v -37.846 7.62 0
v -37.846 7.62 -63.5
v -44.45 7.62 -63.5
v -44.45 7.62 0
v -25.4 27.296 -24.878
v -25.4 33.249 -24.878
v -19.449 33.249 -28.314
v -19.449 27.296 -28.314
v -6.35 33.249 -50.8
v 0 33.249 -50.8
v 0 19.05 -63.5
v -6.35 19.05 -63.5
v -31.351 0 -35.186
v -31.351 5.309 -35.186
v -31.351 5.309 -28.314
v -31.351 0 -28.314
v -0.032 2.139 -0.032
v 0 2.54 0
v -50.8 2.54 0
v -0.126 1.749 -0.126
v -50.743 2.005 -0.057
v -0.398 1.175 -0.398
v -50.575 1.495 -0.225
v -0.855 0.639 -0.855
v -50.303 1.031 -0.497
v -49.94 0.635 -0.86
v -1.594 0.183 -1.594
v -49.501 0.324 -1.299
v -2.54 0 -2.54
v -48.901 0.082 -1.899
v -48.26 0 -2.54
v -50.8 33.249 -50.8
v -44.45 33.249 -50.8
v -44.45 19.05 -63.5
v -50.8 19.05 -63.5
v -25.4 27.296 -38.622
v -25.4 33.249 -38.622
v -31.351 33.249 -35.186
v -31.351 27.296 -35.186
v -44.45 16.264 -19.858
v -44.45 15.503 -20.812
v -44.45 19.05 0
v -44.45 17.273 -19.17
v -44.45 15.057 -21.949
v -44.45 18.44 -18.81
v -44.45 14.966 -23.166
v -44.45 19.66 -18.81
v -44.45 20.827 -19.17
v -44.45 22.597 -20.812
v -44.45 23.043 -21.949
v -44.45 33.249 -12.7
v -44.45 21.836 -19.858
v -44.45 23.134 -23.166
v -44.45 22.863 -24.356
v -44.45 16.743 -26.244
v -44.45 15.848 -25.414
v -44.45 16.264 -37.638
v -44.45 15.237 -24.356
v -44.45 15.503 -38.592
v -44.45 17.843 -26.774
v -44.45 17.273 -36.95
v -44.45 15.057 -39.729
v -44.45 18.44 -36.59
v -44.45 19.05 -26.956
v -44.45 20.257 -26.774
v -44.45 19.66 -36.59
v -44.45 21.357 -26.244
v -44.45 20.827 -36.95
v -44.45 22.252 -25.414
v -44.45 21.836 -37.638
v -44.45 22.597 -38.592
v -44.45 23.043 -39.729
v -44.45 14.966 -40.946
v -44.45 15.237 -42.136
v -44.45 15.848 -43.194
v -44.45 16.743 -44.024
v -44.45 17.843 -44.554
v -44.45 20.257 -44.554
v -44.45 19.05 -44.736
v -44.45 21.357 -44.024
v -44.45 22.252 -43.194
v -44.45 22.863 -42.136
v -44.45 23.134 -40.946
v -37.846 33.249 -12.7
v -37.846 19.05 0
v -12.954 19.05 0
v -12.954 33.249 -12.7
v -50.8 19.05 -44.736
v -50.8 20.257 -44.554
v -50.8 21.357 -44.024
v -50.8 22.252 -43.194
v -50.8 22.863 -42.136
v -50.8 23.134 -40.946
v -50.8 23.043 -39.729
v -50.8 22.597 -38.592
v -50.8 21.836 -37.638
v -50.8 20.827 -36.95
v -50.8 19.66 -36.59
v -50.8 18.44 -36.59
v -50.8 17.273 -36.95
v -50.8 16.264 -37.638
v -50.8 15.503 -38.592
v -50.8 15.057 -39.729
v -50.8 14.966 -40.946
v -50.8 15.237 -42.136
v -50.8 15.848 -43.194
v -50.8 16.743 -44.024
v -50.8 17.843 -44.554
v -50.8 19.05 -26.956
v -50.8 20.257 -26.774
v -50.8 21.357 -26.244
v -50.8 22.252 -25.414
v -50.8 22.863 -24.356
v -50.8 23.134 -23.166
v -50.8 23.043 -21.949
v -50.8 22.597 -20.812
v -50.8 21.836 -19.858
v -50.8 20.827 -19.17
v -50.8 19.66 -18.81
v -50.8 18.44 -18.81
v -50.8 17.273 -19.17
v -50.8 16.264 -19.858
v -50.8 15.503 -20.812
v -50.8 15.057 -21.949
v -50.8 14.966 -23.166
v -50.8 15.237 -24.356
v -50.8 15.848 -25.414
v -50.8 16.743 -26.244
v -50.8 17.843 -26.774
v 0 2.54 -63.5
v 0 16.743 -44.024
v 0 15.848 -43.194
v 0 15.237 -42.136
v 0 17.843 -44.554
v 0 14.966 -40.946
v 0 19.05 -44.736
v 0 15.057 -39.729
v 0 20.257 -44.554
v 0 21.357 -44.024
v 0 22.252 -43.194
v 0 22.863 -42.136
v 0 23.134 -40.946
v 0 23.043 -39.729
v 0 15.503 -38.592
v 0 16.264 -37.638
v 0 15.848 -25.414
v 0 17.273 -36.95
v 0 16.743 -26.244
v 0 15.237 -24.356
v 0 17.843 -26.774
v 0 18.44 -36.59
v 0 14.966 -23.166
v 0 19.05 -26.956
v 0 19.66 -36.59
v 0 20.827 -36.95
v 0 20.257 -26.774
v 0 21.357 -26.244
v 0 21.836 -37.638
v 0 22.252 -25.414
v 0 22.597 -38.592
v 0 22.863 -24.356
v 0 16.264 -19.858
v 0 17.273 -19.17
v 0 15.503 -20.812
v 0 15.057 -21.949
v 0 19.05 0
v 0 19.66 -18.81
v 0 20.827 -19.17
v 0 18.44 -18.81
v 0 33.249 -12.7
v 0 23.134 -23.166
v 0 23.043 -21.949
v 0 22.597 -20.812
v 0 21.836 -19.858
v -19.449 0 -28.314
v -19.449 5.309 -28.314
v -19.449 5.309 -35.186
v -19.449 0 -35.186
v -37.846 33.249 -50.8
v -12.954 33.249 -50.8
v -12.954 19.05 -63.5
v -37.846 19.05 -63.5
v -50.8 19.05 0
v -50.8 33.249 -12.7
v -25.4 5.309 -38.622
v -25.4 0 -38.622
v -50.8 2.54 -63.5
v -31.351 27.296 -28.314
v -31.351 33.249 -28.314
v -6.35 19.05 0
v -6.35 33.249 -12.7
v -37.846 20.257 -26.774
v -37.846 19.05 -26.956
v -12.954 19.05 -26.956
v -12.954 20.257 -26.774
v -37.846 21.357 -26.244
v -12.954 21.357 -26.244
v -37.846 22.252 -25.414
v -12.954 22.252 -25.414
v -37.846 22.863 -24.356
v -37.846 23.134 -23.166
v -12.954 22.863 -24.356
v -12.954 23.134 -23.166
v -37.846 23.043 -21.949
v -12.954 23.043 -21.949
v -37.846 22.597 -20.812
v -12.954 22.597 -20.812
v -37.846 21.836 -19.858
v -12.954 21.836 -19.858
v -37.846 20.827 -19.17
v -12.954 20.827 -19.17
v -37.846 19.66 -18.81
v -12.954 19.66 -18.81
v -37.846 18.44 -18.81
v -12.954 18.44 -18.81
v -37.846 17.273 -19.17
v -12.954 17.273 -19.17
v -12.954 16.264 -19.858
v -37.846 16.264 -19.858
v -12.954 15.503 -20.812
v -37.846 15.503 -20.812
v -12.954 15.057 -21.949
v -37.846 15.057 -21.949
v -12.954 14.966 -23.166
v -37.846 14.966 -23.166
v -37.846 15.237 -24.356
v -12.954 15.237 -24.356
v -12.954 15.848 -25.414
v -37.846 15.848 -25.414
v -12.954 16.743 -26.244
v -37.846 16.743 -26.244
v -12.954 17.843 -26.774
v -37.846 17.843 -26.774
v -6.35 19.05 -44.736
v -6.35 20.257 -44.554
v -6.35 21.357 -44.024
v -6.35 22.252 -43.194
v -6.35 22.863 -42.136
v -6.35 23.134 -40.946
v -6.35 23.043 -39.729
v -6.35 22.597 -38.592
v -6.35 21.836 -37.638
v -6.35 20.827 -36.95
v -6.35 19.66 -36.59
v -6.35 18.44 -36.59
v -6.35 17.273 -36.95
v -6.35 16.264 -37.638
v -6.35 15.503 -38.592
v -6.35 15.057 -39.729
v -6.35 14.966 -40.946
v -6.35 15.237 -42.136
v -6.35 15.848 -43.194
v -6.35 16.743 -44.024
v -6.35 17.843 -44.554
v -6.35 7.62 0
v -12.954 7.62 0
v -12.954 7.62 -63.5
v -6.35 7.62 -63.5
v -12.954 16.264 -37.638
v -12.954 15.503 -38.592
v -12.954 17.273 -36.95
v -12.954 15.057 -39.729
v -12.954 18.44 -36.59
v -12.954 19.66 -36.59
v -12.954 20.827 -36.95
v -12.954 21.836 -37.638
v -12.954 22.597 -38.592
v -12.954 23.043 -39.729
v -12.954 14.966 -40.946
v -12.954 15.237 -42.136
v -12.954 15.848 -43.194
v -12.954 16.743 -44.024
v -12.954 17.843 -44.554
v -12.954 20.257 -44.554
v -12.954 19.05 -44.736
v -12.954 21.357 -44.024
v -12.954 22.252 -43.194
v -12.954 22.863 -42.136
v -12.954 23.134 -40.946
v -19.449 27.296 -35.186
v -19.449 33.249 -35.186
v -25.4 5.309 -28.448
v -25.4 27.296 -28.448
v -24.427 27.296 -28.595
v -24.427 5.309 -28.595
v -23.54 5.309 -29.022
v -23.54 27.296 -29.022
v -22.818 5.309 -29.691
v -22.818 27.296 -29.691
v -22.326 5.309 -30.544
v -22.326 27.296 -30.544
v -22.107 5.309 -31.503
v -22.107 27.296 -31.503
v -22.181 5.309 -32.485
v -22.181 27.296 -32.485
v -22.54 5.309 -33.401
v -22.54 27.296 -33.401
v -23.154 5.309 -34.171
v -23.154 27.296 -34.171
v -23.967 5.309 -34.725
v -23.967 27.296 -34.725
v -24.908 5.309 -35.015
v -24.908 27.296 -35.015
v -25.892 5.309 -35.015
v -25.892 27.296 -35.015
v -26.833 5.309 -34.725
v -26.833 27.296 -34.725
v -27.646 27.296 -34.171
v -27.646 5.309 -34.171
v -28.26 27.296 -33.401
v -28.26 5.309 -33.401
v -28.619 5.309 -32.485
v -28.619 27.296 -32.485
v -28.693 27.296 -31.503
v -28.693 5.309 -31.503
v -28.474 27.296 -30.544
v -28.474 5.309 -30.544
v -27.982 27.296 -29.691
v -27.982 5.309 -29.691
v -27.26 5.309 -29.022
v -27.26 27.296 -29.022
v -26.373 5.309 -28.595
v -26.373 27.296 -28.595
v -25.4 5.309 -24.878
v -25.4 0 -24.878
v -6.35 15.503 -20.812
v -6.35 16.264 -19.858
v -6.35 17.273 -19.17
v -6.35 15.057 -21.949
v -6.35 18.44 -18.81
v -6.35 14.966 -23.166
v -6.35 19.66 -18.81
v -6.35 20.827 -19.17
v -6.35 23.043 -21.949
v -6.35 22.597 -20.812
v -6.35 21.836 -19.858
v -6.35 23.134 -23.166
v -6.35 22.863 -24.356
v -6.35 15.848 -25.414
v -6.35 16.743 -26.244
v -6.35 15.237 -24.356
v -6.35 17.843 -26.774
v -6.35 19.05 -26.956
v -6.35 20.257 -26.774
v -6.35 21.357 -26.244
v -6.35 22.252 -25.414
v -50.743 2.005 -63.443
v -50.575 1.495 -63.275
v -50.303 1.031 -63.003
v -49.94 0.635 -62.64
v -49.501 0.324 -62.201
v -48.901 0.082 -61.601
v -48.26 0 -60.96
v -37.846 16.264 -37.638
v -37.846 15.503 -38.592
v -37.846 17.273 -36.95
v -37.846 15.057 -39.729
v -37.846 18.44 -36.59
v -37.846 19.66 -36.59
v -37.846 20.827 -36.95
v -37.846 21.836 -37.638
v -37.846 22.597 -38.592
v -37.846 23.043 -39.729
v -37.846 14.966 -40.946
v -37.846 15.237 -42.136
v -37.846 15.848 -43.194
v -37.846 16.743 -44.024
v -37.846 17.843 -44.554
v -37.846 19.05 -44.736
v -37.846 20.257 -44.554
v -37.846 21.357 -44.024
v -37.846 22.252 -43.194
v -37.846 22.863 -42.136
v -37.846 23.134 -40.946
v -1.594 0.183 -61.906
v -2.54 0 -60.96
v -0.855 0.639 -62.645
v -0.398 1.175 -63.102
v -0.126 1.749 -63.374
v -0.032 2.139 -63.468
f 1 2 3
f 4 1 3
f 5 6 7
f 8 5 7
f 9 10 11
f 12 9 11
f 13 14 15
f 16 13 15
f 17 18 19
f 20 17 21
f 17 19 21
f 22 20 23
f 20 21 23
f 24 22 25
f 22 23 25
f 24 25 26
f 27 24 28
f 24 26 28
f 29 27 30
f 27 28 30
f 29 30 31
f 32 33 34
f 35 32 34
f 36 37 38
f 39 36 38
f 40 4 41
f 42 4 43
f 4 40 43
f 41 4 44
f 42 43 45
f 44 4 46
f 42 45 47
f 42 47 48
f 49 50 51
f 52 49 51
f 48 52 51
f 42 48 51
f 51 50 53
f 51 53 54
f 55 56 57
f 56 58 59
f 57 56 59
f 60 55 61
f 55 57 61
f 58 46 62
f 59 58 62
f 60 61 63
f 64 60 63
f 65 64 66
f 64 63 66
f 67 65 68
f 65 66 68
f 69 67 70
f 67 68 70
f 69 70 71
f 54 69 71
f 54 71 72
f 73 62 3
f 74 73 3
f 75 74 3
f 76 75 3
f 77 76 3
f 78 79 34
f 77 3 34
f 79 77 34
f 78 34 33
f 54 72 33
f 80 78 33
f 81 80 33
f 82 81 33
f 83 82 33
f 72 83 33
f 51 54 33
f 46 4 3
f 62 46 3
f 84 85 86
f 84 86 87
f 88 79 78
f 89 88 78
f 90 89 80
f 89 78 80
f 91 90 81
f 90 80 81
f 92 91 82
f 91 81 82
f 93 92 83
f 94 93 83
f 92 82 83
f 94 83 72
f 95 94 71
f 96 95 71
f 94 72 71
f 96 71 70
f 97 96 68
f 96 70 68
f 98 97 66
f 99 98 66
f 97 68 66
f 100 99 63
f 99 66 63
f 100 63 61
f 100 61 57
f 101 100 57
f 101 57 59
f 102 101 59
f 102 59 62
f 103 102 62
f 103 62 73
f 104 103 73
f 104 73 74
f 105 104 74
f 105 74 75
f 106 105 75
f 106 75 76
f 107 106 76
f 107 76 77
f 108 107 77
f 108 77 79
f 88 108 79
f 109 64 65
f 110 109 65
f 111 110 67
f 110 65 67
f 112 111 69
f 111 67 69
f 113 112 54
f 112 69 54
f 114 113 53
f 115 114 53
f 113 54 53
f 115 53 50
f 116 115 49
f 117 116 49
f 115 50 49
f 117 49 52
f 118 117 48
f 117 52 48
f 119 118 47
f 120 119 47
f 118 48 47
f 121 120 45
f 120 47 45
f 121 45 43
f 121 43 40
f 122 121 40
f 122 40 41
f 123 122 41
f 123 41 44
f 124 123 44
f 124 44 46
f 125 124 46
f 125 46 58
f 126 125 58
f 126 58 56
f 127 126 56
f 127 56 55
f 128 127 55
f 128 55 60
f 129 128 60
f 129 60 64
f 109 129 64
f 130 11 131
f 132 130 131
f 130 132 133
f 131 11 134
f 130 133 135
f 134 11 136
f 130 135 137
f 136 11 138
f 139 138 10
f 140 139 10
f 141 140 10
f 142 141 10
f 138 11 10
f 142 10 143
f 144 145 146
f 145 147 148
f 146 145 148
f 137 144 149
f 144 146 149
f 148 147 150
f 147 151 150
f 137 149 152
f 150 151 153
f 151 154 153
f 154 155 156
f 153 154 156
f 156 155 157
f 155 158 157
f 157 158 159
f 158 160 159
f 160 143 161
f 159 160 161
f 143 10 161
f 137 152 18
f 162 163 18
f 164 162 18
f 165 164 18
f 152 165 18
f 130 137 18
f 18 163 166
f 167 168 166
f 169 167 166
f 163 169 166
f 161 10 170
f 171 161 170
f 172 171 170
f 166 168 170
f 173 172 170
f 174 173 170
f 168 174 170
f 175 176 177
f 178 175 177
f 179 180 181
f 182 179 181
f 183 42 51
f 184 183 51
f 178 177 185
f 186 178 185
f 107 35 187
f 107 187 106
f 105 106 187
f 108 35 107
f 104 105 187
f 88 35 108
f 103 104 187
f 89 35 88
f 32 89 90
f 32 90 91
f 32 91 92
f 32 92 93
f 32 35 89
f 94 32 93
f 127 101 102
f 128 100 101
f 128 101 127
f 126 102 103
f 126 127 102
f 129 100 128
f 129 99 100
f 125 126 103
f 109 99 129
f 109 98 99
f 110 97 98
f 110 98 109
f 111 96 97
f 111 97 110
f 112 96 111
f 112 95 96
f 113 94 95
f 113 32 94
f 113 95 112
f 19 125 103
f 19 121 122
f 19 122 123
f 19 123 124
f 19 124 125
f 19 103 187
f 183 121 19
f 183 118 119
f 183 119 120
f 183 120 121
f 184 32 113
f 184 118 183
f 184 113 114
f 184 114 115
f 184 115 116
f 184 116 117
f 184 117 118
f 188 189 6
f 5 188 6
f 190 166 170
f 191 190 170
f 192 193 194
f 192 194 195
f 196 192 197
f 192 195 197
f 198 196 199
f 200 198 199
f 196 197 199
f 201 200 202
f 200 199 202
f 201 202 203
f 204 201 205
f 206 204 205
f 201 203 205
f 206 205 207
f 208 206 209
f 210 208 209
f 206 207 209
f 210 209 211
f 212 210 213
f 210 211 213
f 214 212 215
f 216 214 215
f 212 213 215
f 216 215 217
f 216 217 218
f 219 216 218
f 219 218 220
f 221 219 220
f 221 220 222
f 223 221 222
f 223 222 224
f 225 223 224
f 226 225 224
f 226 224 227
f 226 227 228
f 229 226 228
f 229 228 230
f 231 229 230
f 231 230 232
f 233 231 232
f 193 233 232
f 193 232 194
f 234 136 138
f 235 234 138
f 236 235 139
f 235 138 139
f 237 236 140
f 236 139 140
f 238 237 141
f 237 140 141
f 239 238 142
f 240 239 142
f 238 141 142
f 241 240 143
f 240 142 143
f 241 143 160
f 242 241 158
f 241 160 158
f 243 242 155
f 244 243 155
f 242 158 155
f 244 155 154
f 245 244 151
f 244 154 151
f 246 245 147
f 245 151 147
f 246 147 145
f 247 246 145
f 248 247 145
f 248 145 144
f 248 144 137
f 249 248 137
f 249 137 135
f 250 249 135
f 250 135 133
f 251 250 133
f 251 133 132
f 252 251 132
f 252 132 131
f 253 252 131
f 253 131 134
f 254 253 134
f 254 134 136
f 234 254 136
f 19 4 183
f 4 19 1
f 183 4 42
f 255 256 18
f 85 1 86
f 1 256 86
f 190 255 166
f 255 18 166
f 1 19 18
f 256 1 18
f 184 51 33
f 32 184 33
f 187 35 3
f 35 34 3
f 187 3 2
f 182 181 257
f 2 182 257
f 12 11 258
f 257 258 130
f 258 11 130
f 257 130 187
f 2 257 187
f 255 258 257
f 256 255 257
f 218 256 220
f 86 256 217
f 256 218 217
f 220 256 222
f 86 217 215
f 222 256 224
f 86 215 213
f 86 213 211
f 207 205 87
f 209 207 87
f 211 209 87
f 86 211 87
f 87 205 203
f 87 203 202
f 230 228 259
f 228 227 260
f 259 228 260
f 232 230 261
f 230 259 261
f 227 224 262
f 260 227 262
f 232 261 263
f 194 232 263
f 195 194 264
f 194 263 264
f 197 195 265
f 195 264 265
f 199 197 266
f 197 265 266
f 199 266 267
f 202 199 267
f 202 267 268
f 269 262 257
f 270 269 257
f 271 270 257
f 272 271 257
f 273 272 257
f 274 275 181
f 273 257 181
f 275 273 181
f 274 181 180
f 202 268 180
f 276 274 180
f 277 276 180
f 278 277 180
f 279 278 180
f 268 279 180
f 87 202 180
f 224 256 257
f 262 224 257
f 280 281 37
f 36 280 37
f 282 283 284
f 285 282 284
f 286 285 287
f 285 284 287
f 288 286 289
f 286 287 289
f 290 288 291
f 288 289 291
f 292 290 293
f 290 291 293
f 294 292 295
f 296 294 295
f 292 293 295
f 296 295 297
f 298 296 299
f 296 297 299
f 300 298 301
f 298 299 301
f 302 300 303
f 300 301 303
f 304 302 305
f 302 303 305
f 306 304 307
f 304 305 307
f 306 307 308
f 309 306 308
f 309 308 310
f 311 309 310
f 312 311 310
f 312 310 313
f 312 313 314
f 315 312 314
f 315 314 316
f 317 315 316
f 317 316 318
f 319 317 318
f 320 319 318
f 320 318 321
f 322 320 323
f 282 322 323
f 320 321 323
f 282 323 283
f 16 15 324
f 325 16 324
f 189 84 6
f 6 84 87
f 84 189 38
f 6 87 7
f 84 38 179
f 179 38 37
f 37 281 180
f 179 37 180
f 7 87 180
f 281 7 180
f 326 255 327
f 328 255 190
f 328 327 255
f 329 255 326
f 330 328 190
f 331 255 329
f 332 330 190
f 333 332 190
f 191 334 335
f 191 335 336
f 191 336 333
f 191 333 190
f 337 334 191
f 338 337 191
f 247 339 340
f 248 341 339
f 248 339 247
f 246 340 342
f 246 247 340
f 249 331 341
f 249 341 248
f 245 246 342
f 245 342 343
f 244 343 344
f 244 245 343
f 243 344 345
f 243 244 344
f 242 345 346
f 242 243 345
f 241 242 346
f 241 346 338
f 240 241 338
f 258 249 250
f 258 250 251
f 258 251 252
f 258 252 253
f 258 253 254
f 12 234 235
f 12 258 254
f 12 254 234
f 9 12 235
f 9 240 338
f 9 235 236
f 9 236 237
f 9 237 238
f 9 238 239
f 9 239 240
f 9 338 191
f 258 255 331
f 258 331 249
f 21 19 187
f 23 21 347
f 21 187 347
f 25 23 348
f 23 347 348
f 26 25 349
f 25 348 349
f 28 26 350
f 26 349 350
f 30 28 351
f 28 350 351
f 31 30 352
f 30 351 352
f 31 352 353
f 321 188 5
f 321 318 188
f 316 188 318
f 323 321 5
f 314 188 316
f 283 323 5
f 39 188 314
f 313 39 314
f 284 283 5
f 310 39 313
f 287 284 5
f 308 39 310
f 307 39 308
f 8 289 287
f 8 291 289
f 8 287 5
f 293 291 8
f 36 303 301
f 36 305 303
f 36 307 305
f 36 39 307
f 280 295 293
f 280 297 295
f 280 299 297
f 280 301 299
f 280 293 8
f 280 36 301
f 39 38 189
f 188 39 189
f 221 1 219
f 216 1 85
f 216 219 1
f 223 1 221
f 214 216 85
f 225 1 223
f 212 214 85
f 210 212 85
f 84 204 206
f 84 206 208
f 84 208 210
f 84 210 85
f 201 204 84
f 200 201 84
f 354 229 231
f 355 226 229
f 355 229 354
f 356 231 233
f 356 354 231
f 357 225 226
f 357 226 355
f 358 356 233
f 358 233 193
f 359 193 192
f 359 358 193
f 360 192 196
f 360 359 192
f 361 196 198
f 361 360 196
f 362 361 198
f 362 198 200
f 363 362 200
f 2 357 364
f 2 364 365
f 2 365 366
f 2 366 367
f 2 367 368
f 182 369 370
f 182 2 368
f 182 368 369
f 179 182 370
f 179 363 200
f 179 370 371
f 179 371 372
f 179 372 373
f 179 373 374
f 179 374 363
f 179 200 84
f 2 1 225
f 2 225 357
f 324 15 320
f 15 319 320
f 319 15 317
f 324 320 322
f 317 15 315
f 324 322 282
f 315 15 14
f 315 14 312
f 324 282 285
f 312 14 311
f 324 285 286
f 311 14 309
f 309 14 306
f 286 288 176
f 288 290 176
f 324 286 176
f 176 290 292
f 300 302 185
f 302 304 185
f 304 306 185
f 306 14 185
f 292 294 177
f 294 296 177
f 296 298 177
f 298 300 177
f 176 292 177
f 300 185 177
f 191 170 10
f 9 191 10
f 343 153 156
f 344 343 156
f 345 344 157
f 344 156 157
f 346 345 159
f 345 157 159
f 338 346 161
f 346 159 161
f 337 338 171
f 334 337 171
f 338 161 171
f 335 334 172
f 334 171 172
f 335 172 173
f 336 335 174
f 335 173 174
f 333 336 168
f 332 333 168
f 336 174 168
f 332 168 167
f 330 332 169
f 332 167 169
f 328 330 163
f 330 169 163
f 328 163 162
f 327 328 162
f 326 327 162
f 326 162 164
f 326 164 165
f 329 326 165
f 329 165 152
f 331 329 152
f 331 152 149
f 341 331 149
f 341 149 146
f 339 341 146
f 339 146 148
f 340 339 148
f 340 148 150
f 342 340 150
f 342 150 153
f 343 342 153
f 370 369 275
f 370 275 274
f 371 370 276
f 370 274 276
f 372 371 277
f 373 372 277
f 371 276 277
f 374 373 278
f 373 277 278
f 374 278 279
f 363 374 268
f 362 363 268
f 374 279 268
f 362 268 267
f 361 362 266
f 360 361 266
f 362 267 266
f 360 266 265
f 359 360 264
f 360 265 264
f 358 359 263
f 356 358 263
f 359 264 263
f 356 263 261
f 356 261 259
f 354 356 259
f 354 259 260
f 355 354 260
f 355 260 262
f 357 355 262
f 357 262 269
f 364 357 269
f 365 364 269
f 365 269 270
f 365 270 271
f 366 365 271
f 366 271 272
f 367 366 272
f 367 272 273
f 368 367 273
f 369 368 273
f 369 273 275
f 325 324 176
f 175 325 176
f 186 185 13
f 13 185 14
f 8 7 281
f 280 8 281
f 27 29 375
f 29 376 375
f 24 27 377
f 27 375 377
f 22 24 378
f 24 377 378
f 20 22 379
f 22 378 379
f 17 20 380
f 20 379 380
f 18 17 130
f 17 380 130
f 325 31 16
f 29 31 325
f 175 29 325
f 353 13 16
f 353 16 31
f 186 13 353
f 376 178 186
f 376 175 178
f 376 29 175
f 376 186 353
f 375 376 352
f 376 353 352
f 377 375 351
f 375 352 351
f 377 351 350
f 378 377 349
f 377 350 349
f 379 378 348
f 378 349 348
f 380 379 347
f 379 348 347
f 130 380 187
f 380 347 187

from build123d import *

# Parameters (mm, degrees)
SKETCH1_W           = 63.5
SKETCH1_H           = 6.35
BOSS_EXTRUDE1_DEPTH = 50.8
BOSS_EXTRUDE2_DEPTH = 50.8
SKETCH10_W          = 6.604
SKETCH10_H          = 25.629031657
CUT_EXTRUDE1_DEPTH  = 88.854357354
LPATTERN3_COUNT     = 2
LPATTERN3_PITCH     = 31.496
SKETCH11_R          = 4.09575
CUT_EXTRUDE2_DEPTH  = 88.854357354
CUT_EXTRUDE3_DEPTH  = 5.953125
LPATTERN4_COUNT     = 2
LPATTERN4_PITCH     = 27.94
SKETCH20_R          = 3.302
CUT_EXTRUDE4_DEPTH  = 21.986875
FILLET1_R           = 2.54


with BuildPart() as part:
    # Sketch1 → Boss-Extrude1 (new body)
    with BuildSketch(Plane(origin=(0, 0, 0), x_dir=(0, 0, -1), z_dir=(1, 0, 0))):
        with Locations((31.75, 3.175)):
            Rectangle(SKETCH1_W, SKETCH1_H)
    extrude(amount=-BOSS_EXTRUDE1_DEPTH)

    # Sketch2 → Boss-Extrude2 (add)
    with BuildSketch(Plane(origin=(0, 0, 0), x_dir=(0, 0, -1), z_dir=(1, 0, 0))):
        Polygon((0, 6.35), (0, 19.05), (12.7, 33.249031657), (50.8, 33.249031657), (63.5, 19.05), (63.5, 6.35), align=None)
    extrude(amount=-BOSS_EXTRUDE2_DEPTH)

    # Sketch10 → Cut-Extrude1 (cut, through all)
    with BuildSketch(Plane(origin=(0, 0, -63.5), x_dir=(-1, 0, 0), z_dir=(0, 0, -1))):
        with Locations((9.652, 20.434515829)):
            Rectangle(SKETCH10_W, SKETCH10_H)
    cut_extrude1 = extrude(amount=-CUT_EXTRUDE1_DEPTH, mode=Mode.SUBTRACT)

    # LPattern3: Cut-Extrude1 ×2
    with Locations(*[(-i * LPATTERN3_PITCH, 0, 0) for i in range(1, LPATTERN3_COUNT)]):
        add(cut_extrude1, mode=Mode.SUBTRACT)

    # Sketch11 → Cut-Extrude2 (cut, through all)
    with BuildSketch(Plane(origin=(0, 0, 0), x_dir=(0, 0, -1), z_dir=(1, 0, 0))):
        with Locations((22.86, 19.05)):
            Circle(SKETCH11_R)
        with Locations((40.64, 19.05)):
            Circle(SKETCH11_R)
    extrude(amount=-CUT_EXTRUDE2_DEPTH, mode=Mode.SUBTRACT)

    # Sketch19 → Cut-Extrude3 (cut)
    with BuildSketch(Plane(origin=(0, 33.249031657, 0), x_dir=(1, 0, 0), z_dir=(0, 1, 0))):
        Polygon((-19.448913651, 35.185861306), (-25.4, 38.621722611), (-31.351086349, 35.185861306), (-31.351086349, 28.314138694), (-25.4, 24.878277389), (-19.448913651, 28.314138694), align=None)
    cut_extrude3 = extrude(amount=-CUT_EXTRUDE3_DEPTH, mode=Mode.SUBTRACT)

    # LPattern4: Cut-Extrude3 ×2
    with Locations(*[(0, -i * LPATTERN4_PITCH, 0) for i in range(1, LPATTERN4_COUNT)]):
        add(cut_extrude3, mode=Mode.SUBTRACT)

    # Sketch20 → Cut-Extrude4 (cut)
    with BuildSketch(Plane(origin=(0, 27.295906657, 0), x_dir=(1, 0, 0), z_dir=(0, 1, 0))):
        with Locations(Location((-25.4, 31.75, 0), (0, 0, 270))):
            Circle(SKETCH20_R)
    extrude(amount=-CUT_EXTRUDE4_DEPTH, mode=Mode.SUBTRACT)

    # Fillet1
    fillet1_edges = [part.edges().sort_by_distance(p)[0] for p in [
        (0, 0, -31.75),
        (-50.8, 0, -31.75),
        (-25.4, 0, -63.5),
        (-25.4, 0, 0),
    ]]
    fillet(fillet1_edges, radius=FILLET1_R)


solid = part.part
